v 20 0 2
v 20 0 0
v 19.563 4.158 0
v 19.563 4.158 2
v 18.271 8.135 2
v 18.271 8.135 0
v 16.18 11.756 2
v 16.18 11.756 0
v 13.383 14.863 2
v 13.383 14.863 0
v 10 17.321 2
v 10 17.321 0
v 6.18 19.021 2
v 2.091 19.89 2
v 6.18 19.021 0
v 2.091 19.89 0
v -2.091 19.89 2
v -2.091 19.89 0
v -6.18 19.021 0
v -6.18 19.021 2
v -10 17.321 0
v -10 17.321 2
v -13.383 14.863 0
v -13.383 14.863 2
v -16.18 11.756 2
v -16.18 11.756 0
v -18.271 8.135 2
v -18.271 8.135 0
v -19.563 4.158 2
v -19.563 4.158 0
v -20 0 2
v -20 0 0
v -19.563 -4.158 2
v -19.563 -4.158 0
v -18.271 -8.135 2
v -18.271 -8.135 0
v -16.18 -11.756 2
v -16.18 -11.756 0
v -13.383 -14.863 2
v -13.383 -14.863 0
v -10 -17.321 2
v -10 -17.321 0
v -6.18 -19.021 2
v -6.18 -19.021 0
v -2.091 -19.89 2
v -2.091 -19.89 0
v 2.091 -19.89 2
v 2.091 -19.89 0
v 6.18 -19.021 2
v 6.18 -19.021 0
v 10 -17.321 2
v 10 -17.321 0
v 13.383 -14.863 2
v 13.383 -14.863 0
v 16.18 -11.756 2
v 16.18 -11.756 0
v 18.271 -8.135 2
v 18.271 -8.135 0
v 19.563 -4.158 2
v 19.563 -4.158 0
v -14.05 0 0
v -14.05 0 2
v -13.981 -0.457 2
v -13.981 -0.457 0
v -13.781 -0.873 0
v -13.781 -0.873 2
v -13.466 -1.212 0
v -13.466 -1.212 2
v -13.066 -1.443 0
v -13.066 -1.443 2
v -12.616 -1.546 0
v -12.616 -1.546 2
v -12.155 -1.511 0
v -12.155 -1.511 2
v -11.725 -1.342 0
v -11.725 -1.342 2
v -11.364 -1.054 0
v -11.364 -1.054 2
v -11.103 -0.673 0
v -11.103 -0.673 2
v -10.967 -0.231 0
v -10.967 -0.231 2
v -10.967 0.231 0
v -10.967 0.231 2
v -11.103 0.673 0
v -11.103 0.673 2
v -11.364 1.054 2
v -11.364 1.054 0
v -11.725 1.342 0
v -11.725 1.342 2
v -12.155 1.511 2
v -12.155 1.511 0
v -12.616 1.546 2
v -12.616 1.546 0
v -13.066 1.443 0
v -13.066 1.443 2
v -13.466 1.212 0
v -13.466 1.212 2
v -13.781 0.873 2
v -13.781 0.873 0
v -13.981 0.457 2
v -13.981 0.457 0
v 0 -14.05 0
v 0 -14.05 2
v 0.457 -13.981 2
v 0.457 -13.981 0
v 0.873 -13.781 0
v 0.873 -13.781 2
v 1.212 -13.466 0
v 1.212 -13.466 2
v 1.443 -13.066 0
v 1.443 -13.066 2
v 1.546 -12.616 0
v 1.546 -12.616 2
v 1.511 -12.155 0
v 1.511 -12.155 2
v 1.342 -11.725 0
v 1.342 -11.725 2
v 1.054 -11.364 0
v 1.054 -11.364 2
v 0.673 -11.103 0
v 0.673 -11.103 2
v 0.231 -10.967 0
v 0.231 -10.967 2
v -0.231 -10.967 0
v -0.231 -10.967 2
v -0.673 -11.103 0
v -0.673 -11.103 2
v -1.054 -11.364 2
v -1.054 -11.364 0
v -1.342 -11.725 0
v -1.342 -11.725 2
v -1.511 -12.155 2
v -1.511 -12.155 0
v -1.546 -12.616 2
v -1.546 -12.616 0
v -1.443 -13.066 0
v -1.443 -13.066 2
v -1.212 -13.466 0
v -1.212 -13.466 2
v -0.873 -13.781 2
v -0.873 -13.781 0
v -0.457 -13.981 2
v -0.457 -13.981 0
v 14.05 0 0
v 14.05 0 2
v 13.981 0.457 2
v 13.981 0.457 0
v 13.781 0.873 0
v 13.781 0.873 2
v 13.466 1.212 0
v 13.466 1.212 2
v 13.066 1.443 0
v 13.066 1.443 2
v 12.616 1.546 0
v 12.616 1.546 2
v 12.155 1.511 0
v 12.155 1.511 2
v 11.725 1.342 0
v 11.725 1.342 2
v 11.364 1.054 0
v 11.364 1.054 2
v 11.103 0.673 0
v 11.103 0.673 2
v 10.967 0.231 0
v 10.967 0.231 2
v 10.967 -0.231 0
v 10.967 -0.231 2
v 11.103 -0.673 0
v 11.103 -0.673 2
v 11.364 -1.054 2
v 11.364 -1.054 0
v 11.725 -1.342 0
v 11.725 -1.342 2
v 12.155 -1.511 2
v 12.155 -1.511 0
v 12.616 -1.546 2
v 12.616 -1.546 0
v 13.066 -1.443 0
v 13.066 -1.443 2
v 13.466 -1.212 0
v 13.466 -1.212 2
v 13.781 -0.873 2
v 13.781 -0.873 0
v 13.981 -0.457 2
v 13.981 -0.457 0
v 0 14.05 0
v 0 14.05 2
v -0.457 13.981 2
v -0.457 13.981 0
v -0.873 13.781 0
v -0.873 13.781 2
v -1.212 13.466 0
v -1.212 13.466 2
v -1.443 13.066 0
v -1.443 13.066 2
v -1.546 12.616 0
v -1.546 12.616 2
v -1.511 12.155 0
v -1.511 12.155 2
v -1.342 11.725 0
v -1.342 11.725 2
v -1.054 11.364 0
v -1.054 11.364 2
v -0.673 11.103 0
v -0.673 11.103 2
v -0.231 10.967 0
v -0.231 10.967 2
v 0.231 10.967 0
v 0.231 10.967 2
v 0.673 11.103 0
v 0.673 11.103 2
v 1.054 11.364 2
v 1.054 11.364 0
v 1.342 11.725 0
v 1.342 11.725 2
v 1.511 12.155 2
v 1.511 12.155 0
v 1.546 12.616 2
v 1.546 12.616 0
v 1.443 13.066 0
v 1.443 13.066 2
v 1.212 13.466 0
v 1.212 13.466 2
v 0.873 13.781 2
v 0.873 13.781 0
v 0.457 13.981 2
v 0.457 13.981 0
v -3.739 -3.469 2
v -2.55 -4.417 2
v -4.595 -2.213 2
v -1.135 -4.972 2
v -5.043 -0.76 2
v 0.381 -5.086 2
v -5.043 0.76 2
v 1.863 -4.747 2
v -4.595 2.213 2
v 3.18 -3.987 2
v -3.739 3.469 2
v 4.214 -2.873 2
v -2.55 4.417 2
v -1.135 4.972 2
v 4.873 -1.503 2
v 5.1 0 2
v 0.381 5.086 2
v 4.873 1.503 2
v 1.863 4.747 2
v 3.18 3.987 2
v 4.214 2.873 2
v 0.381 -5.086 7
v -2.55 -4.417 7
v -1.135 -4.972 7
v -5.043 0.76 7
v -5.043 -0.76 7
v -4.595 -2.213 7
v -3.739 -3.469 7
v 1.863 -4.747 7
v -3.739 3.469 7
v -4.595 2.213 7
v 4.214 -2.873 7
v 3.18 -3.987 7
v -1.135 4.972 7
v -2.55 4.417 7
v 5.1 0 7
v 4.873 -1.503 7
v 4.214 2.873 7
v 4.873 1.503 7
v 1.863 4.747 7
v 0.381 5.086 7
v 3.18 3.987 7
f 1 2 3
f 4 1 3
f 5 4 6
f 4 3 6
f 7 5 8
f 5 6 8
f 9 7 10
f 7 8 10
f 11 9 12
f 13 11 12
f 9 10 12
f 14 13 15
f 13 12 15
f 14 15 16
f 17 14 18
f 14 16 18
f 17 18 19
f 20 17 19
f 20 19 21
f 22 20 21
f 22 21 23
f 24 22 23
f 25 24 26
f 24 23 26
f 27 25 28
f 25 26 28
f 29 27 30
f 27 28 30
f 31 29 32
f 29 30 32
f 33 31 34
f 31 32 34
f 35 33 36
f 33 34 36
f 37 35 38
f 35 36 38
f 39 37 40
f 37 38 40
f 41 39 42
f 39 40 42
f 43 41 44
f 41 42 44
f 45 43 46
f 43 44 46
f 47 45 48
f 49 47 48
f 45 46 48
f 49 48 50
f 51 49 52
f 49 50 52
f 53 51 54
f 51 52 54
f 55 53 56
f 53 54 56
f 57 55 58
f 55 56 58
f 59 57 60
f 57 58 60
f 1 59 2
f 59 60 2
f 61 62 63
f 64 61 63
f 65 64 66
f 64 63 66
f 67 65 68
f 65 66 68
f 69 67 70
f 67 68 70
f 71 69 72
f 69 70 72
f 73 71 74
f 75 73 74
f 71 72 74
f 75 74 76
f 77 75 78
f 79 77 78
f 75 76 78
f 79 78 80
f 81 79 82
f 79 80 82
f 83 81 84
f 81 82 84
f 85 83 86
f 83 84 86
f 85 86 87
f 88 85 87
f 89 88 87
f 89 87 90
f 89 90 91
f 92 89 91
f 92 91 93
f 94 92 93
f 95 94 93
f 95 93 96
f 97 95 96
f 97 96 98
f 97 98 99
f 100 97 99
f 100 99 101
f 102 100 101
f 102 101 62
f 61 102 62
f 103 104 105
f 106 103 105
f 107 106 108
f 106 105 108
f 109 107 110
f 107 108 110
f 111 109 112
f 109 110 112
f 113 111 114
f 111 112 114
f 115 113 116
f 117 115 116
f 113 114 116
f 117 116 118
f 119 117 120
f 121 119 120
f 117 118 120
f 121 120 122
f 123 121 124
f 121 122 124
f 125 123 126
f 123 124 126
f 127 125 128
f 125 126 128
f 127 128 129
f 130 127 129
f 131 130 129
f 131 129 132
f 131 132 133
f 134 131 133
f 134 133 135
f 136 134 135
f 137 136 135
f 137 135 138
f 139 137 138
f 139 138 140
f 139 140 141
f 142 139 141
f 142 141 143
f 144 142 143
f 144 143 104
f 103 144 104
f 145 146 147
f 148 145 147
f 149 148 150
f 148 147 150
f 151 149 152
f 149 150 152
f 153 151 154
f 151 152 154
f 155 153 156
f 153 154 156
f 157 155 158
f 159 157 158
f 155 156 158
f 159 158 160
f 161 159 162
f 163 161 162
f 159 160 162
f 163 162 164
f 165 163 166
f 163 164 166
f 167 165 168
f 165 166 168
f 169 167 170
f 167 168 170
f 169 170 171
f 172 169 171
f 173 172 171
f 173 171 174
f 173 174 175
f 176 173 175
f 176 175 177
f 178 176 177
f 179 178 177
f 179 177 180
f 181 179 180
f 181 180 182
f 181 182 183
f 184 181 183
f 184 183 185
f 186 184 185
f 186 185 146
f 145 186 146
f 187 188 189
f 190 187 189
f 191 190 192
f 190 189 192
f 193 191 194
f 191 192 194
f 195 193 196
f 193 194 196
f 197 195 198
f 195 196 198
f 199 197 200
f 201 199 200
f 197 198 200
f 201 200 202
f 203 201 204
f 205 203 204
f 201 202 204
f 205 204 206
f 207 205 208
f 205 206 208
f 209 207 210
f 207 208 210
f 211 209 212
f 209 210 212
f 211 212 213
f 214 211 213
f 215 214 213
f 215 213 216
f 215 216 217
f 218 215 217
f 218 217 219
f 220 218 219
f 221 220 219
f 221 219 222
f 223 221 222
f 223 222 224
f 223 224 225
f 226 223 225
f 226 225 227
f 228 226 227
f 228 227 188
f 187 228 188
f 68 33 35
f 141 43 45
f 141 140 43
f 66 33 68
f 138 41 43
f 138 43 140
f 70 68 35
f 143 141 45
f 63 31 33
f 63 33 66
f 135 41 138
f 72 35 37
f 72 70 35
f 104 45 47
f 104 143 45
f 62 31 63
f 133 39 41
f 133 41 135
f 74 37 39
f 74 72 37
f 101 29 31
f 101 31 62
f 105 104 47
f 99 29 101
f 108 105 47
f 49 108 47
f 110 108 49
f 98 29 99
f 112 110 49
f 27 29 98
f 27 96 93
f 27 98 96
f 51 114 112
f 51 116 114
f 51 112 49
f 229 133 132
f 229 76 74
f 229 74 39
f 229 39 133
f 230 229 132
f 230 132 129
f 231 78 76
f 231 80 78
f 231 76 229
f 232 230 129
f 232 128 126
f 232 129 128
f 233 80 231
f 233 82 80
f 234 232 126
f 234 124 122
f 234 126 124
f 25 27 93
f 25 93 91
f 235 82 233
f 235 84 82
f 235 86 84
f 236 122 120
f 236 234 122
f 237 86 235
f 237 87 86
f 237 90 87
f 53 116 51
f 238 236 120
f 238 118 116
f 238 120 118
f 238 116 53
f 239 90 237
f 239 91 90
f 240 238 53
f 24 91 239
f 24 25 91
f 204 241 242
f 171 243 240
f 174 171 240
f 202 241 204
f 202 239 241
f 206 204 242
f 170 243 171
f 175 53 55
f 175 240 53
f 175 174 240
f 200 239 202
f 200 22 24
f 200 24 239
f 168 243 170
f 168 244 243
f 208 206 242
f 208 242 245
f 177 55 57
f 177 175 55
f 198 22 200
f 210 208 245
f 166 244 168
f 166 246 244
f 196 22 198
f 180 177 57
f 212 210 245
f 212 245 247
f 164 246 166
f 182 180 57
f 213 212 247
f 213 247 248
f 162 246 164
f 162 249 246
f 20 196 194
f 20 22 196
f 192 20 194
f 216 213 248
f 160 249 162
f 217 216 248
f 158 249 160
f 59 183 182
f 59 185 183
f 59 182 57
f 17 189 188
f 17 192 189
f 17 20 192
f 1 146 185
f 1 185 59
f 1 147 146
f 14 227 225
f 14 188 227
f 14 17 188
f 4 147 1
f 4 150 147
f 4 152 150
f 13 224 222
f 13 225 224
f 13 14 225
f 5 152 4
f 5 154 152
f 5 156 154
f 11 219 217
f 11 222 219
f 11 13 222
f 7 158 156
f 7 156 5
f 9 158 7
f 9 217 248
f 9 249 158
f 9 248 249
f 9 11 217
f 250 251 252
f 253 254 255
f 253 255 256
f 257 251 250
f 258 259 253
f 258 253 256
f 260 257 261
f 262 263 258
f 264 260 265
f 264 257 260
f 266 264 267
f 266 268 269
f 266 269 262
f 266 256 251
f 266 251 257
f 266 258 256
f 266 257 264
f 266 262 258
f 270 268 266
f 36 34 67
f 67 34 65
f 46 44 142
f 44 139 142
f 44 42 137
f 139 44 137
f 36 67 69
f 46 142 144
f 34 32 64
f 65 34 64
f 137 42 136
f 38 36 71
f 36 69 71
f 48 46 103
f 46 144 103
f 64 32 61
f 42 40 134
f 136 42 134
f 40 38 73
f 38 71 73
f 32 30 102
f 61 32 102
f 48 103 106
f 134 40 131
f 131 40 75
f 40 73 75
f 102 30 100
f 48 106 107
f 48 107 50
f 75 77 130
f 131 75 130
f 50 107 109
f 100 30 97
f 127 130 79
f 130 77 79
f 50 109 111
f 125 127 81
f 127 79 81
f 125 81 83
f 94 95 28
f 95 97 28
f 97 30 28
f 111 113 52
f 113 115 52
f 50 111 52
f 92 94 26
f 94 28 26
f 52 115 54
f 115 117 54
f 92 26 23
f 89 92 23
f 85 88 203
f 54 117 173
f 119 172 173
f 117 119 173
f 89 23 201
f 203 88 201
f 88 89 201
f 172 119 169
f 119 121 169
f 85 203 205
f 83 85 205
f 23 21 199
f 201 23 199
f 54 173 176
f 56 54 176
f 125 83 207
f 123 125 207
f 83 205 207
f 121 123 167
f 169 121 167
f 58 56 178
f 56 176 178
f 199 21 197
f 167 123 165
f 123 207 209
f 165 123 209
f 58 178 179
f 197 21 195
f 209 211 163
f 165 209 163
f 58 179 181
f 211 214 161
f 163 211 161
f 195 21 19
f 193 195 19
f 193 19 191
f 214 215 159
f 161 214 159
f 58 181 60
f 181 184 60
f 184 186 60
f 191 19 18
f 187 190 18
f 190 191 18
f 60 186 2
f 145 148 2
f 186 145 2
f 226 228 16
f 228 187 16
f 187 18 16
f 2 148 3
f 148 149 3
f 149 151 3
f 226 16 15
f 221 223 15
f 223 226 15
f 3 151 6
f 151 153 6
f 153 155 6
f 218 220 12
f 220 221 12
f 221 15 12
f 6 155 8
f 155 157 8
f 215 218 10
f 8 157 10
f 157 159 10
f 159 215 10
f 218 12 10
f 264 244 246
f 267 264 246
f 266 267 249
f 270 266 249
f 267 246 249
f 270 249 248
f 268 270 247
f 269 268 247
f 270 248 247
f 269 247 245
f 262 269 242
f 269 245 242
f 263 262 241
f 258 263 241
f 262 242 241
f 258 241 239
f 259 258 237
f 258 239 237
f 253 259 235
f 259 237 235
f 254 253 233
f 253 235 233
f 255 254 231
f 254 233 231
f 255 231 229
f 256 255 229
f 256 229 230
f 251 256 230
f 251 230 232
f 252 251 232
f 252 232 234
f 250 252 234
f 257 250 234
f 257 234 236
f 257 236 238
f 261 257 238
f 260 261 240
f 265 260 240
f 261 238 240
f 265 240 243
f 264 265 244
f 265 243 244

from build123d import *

# Parameters (mm, degrees)
ESBO_O1_R                = 20
RESSALTO_EXTRUS_O1_DEPTH = 2
ESBO_O2_R                = 5.1
RESSALTO_EXTRUS_O2_DEPTH = 5
ESBO_O3_R                = 1.55
CORTE_EXTRUS_O1_DEPTH    = 29.722813233
PADR_OCIRCULAR1_COUNT    = 4


with BuildPart() as part:
    # Esboço1 → Ressalto-extrusão1 (new body)
    with BuildSketch(Plane.XY):
        Circle(ESBO_O1_R)
    extrude(amount=RESSALTO_EXTRUS_O1_DEPTH)

    # Esboço2 → Ressalto-extrusão2 (add)
    with BuildSketch(Plane.XY.offset(2)):
        Circle(ESBO_O2_R)
    extrude(amount=RESSALTO_EXTRUS_O2_DEPTH)

    # Esboço3 → Corte-extrusão1 (cut, through all)
    with BuildSketch(Plane.XY.offset(2)):
        with Locations((12.5, 0)):
            Circle(ESBO_O3_R)
    corte_extrus_o1 = extrude(amount=-CORTE_EXTRUS_O1_DEPTH, mode=Mode.SUBTRACT)

    # PadrãoCircular1: Corte-extrusão1 ×4 about axis
    padr_ocircular1_axis = Axis((0, 0, 0), (0, 0, 1))
    for i in range(1, PADR_OCIRCULAR1_COUNT):
        add(corte_extrus_o1.rotate(padr_ocircular1_axis, i * 360 / PADR_OCIRCULAR1_COUNT), mode=Mode.SUBTRACT)


solid = part.part
